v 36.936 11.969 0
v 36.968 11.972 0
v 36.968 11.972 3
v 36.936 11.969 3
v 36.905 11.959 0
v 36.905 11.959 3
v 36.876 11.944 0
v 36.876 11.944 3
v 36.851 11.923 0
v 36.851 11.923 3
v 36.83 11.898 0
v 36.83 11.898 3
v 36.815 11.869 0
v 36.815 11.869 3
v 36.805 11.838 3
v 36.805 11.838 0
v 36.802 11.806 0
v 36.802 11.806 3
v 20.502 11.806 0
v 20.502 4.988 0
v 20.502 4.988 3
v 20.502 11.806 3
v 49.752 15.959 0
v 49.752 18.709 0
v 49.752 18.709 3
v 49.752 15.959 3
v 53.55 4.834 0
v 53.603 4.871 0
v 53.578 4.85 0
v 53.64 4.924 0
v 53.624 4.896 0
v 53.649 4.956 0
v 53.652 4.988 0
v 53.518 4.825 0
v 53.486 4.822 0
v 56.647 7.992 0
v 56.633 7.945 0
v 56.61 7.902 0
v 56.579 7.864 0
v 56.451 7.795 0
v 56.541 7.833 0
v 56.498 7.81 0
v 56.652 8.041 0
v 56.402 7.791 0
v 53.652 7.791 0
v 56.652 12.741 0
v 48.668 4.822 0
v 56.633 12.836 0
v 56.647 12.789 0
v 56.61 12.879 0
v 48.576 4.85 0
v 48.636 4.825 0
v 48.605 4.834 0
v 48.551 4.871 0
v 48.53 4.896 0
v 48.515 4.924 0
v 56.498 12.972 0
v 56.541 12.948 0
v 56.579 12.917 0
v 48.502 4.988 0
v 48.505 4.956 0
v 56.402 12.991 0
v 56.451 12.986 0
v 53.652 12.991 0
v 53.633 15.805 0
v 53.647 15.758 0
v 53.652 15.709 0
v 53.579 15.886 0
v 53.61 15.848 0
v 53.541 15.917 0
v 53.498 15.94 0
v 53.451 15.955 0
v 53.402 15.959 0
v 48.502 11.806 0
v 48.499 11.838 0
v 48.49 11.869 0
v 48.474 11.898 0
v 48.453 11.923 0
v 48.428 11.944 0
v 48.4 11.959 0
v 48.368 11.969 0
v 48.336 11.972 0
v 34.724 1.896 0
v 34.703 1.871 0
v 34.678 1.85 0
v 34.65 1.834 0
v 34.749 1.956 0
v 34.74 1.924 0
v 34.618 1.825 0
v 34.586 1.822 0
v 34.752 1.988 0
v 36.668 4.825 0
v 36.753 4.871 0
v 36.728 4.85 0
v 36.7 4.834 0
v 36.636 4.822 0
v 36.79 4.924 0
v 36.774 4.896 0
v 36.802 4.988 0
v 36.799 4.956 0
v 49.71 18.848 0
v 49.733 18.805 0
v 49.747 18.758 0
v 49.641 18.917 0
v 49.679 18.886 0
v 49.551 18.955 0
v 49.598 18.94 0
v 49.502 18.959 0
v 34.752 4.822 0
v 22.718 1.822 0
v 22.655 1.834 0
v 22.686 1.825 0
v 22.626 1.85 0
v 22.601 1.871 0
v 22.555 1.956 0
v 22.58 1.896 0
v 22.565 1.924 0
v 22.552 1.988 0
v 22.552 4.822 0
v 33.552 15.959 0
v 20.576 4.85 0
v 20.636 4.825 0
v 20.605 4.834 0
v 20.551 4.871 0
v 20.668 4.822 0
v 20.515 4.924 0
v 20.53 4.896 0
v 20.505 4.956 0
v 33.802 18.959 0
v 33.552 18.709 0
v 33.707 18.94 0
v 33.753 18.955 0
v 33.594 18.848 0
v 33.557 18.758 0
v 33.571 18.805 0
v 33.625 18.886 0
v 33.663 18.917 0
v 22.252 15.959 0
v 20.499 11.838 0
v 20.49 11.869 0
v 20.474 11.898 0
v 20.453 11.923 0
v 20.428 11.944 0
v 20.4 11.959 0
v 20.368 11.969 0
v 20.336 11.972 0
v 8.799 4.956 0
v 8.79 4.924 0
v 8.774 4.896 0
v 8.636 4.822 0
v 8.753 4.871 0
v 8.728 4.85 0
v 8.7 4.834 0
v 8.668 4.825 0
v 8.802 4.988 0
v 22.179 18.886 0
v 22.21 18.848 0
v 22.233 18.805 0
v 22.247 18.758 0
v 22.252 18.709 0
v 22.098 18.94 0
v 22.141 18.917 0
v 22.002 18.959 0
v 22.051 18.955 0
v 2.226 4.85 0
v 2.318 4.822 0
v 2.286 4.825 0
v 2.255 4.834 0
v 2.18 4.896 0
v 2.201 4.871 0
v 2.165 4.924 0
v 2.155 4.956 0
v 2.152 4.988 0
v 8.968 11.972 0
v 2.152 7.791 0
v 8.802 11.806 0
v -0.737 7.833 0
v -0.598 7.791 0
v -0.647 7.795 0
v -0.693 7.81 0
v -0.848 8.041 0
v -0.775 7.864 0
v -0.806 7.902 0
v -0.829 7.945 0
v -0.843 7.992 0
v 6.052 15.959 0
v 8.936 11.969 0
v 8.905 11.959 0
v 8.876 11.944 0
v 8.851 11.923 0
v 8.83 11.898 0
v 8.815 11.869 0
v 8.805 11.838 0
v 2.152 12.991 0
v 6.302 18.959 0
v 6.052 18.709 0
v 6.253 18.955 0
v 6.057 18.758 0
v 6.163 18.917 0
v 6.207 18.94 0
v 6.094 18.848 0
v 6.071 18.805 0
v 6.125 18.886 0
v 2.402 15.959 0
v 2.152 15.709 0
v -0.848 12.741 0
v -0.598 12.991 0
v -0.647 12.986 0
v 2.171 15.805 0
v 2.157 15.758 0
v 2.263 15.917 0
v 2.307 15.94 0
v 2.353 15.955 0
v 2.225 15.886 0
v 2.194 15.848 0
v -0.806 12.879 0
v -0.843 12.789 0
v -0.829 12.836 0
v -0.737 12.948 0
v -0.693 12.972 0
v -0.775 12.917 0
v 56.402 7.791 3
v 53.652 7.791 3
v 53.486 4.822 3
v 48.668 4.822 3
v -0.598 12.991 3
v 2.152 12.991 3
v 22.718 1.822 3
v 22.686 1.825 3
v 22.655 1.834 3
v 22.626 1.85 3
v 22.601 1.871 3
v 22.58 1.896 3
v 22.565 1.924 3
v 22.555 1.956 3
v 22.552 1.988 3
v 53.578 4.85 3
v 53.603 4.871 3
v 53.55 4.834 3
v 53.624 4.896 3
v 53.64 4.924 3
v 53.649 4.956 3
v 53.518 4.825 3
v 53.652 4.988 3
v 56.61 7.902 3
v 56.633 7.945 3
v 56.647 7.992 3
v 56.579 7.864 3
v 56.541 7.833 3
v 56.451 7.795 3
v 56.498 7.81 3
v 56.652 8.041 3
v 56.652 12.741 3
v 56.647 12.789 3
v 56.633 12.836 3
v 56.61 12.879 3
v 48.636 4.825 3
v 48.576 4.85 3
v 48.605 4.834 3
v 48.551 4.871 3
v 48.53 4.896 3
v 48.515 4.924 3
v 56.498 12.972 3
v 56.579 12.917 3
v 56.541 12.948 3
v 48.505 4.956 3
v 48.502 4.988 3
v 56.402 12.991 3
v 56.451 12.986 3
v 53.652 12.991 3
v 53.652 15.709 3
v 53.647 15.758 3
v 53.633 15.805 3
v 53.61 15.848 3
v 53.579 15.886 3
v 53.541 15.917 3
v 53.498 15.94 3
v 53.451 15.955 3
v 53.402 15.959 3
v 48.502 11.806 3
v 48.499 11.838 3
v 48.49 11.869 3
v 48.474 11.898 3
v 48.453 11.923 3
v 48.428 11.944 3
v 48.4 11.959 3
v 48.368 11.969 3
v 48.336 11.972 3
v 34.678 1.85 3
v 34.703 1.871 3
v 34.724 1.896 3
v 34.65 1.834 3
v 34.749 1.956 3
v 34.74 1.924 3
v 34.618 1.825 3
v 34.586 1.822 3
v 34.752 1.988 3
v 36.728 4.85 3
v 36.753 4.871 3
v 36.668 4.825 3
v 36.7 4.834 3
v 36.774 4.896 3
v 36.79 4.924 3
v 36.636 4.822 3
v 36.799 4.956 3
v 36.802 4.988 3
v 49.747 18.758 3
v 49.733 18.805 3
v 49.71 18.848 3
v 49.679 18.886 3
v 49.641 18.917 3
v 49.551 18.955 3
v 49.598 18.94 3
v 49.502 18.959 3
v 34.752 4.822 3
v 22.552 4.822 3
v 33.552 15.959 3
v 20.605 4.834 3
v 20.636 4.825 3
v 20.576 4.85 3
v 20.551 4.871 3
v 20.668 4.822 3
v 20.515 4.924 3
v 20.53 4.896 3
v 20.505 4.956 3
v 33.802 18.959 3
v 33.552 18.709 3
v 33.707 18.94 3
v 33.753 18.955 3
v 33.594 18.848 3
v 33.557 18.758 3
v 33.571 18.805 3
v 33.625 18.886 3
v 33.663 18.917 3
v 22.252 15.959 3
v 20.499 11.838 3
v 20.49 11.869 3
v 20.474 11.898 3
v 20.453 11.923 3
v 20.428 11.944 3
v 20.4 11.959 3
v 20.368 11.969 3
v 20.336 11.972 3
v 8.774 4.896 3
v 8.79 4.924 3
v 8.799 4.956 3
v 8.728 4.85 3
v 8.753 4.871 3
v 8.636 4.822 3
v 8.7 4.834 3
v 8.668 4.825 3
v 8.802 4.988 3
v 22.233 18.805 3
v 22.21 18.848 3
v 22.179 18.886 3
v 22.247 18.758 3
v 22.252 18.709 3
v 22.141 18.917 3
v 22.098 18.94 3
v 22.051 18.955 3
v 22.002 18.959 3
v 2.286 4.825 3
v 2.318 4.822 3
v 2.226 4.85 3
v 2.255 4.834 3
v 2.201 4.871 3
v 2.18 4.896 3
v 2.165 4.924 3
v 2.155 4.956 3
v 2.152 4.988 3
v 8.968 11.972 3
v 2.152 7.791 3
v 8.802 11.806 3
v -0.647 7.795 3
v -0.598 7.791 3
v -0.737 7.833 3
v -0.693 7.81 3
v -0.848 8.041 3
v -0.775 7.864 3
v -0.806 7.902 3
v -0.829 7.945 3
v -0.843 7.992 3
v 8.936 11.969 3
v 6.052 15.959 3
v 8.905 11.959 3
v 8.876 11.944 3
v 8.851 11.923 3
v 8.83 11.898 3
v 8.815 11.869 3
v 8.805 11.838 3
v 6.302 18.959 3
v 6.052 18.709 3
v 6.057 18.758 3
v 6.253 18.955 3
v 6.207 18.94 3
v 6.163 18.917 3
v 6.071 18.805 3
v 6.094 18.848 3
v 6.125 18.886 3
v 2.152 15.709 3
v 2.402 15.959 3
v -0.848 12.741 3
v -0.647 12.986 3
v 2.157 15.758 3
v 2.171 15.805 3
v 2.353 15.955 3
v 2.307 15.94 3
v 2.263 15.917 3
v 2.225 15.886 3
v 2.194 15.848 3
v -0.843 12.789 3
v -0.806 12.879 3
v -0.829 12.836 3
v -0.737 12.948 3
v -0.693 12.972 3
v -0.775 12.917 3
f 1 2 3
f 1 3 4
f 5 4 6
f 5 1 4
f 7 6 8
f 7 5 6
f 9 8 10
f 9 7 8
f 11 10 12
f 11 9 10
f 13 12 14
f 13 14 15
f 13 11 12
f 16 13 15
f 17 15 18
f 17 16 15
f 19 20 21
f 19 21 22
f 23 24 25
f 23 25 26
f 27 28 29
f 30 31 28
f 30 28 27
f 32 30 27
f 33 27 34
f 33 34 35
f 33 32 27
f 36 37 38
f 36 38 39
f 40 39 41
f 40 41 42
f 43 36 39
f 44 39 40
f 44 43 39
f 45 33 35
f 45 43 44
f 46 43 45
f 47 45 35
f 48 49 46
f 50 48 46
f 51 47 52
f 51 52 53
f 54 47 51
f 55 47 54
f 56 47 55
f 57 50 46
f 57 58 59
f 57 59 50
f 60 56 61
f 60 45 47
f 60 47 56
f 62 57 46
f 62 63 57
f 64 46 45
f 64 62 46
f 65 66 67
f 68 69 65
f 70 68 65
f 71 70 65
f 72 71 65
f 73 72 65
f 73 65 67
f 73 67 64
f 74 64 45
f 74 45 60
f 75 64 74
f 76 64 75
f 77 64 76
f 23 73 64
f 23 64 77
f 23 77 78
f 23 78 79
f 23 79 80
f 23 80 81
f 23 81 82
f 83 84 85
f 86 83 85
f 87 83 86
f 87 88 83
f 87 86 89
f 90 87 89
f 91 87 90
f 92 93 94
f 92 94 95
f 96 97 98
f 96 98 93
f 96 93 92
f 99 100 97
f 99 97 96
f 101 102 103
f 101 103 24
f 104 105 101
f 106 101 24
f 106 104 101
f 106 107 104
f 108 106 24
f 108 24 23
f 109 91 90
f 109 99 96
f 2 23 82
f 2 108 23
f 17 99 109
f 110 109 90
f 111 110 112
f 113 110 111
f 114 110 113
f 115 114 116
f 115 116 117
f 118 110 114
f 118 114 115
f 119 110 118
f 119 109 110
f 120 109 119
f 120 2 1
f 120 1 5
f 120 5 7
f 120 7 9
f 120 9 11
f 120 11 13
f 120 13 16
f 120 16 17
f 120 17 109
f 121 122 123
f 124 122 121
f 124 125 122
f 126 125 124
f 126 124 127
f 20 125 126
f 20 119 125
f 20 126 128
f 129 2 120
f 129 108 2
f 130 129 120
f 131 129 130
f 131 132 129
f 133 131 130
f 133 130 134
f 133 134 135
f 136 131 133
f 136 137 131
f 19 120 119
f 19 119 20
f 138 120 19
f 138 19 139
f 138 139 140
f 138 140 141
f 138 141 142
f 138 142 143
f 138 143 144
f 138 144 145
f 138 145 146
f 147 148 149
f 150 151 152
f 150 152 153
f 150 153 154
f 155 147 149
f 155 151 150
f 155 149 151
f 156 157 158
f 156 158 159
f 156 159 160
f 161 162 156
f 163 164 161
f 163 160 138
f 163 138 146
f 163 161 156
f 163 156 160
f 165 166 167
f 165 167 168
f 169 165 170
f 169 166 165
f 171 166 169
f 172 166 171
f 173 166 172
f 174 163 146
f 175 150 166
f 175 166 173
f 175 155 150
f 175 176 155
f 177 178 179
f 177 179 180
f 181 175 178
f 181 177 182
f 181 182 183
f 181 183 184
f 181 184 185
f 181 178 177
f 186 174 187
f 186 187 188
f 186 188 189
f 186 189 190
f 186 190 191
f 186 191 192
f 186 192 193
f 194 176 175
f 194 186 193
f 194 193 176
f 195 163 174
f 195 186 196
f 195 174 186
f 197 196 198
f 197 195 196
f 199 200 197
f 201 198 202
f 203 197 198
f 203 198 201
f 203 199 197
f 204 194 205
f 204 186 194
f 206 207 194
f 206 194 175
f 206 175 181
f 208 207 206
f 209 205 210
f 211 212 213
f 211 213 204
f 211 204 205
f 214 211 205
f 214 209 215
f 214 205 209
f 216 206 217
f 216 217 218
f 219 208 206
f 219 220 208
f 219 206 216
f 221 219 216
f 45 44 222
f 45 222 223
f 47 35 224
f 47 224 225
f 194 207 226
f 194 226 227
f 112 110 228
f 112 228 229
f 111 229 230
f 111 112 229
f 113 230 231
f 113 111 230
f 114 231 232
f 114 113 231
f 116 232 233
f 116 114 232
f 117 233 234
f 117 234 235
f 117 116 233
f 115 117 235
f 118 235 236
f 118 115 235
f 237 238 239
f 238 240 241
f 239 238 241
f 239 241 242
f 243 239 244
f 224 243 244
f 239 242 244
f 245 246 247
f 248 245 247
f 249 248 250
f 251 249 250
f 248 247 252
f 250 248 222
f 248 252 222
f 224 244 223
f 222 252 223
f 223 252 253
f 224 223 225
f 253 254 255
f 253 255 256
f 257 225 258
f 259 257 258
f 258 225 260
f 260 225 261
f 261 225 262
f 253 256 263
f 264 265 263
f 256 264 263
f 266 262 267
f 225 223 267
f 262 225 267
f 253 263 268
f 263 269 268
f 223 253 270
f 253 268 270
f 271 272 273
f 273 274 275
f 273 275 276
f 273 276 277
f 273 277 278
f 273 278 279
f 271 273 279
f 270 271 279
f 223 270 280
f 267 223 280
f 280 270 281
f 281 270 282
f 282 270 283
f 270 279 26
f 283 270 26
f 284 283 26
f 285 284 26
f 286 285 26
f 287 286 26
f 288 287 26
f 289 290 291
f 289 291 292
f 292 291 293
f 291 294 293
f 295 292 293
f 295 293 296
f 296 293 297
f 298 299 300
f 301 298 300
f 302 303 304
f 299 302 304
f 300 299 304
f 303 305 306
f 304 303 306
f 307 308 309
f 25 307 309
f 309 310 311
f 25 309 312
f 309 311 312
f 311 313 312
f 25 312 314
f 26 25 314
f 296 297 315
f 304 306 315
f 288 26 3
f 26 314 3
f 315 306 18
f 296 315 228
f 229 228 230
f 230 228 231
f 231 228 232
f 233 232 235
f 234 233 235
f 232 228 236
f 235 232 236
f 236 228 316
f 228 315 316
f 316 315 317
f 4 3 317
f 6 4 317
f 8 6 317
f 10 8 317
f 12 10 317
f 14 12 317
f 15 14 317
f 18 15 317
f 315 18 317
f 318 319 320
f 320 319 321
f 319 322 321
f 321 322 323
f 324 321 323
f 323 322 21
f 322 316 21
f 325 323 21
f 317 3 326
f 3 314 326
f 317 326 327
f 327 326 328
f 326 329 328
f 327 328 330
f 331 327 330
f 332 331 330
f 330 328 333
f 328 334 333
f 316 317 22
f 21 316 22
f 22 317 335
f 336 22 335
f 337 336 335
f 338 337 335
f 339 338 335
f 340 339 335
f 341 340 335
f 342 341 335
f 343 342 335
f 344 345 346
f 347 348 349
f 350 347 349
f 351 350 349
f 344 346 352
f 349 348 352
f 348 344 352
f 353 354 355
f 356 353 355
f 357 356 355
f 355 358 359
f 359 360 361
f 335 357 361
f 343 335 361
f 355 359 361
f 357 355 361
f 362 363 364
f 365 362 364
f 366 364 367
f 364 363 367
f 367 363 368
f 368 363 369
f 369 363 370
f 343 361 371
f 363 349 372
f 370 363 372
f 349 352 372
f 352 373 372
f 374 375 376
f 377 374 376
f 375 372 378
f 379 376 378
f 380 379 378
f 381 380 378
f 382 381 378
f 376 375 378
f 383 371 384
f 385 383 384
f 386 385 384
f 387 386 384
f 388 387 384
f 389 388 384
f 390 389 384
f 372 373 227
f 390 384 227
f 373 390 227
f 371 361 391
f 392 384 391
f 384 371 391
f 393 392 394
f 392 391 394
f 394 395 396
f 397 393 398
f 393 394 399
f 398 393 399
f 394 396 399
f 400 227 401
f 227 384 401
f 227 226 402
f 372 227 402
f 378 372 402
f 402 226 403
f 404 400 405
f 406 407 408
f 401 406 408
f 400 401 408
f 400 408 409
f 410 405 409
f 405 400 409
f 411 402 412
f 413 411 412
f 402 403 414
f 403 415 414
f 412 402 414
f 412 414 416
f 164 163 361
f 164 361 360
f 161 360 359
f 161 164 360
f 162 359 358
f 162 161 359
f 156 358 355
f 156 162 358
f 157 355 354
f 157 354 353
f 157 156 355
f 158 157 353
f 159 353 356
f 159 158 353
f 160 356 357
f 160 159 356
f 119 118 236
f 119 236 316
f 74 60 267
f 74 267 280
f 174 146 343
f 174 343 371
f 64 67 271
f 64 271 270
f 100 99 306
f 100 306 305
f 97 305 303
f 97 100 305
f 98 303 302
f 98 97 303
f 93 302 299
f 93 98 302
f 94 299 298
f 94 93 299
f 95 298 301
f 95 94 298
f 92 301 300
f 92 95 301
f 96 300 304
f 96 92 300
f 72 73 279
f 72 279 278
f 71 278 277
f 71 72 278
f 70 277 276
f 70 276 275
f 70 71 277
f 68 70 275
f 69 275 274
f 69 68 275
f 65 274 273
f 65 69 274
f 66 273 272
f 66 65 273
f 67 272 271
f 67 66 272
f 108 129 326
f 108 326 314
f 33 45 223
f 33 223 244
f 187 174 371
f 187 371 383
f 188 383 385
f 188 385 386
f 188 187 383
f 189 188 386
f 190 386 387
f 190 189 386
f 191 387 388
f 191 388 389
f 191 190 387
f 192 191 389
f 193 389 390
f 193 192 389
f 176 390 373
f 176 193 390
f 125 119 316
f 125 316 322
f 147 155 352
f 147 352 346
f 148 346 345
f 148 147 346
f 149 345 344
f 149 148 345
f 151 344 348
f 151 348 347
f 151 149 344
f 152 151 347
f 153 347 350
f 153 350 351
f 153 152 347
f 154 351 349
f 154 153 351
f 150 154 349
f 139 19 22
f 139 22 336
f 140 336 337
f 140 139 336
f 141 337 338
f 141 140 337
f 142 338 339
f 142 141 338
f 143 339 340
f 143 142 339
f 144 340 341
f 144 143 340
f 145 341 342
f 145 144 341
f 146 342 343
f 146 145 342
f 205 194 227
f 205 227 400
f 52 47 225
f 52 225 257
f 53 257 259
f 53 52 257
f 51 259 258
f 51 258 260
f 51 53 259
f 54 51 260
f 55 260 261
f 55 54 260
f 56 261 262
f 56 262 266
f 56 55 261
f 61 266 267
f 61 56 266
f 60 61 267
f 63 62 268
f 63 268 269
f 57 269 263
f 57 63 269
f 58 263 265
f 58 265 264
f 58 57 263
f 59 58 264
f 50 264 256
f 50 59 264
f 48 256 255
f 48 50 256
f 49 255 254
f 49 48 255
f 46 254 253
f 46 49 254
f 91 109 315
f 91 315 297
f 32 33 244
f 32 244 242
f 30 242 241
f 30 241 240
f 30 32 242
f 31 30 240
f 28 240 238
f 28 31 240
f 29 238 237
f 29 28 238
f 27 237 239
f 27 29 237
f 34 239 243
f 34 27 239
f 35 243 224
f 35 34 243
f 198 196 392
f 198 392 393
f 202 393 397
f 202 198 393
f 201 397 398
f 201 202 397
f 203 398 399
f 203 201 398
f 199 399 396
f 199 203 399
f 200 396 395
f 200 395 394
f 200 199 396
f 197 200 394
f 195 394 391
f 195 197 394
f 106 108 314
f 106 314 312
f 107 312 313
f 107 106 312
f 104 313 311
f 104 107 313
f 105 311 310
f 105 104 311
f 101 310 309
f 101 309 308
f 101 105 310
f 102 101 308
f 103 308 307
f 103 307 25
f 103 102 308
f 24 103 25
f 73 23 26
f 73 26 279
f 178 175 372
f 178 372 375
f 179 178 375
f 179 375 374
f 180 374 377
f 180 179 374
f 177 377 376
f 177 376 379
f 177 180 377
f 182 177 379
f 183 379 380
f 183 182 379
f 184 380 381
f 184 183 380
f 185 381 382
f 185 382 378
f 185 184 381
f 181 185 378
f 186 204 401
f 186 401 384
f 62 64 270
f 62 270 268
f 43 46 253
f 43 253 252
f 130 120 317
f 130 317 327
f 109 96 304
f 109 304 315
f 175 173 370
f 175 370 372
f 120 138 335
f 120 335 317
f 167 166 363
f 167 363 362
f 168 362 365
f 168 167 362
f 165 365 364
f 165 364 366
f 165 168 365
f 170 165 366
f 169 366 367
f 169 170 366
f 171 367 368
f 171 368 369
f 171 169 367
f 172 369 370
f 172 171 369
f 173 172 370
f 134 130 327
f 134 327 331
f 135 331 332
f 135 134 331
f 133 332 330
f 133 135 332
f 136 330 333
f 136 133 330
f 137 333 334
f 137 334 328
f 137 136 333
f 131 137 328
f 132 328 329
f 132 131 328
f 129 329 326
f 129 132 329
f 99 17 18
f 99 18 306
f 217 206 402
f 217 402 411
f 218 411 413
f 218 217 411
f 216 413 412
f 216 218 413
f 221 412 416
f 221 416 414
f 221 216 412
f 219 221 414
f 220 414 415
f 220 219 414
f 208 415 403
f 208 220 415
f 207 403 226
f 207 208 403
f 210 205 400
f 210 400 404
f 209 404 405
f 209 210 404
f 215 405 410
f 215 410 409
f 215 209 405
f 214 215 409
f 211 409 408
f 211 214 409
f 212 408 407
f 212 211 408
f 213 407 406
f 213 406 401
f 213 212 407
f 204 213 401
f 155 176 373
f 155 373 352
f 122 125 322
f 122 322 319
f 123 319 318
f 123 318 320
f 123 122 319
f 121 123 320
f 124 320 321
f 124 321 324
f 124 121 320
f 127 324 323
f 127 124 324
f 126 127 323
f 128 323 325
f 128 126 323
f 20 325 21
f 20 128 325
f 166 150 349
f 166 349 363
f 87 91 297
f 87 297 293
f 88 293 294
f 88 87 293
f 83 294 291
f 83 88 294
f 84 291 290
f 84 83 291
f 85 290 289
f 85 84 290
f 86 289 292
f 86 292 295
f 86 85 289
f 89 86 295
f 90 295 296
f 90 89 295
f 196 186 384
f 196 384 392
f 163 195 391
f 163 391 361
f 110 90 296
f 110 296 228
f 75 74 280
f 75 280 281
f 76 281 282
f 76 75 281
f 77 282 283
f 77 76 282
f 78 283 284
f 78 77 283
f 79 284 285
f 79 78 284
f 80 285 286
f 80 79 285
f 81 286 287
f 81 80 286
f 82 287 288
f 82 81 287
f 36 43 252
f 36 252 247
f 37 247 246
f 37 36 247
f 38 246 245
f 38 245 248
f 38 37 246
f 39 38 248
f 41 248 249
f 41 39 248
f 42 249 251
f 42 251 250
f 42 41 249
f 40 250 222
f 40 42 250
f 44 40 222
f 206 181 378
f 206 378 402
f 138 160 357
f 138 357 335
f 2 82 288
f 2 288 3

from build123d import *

# Parameters (mm, degrees)
BOSS_EXTRUDE1_DEPTH = 3


with BuildPart() as part:
    # Sketch2 → Boss-Extrude1 (new body)
    with BuildSketch(Plane.XY):
        with BuildLine():
            Line((53.652188988, 7.790592853), (53.652188988, 4.988083366))
            ThreePointArc((53.652188988, 4.988083366), (53.60349827, 4.870533572), (53.485948476, 4.821842853))
            Line((53.485948476, 4.821842853), (48.668429501, 4.821842853))
            ThreePointArc((48.668429501, 4.821842853), (48.550879707, 4.870533572), (48.502188988, 4.988083366))
            Line((48.502188988, 4.988083366), (48.502188988, 11.80560234))
            ThreePointArc((48.502188988, 11.80560234), (48.45349827, 11.923152134), (48.335948476, 11.971842853))
            Line((48.335948476, 11.971842853), (36.968429501, 11.971842853))
            ThreePointArc((36.968429501, 11.971842853), (36.850879707, 11.923152134), (36.802188988, 11.80560234))
            Line((36.802188988, 11.80560234), (36.802188988, 4.988083366))
            ThreePointArc((36.802188988, 4.988083366), (36.75349827, 4.870533572), (36.635948476, 4.821842853))
            Line((36.635948476, 4.821842853), (34.752188988, 4.821842853))
            Line((34.752188988, 4.821842853), (34.752188988, 1.988083366))
            ThreePointArc((34.752188988, 1.988083366), (34.70349827, 1.870533572), (34.585948476, 1.821842853))
            Line((34.585948476, 1.821842853), (22.718429501, 1.821842853))
            ThreePointArc((22.718429501, 1.821842853), (22.600879707, 1.870533572), (22.552188988, 1.988083366))
            Line((22.552188988, 1.988083366), (22.552188988, 4.821842853))
            Line((22.552188988, 4.821842853), (20.668429501, 4.821842853))
            ThreePointArc((20.668429501, 4.821842853), (20.550879707, 4.870533572), (20.502188988, 4.988083366))
            Line((20.502188988, 4.988083366), (20.502188988, 11.80560234))
            ThreePointArc((20.502188988, 11.80560234), (20.45349827, 11.923152134), (20.335948476, 11.971842853))
            Line((20.335948476, 11.971842853), (8.968429501, 11.971842853))
            ThreePointArc((8.968429501, 11.971842853), (8.850879707, 11.923152134), (8.802188988, 11.80560234))
            Line((8.802188988, 11.80560234), (8.802188988, 4.988083366))
            ThreePointArc((8.802188988, 4.988083366), (8.75349827, 4.870533572), (8.635948476, 4.821842853))
            Line((8.635948476, 4.821842853), (2.318429501, 4.821842853))
            ThreePointArc((2.318429501, 4.821842853), (2.200879707, 4.870533572), (2.152188988, 4.988083366))
            Line((2.152188988, 4.988083366), (2.152188988, 7.790592853))
            Line((2.152188988, 7.790592853), (-0.597811012, 7.790592853))
            ThreePointArc((-0.597811012, 7.790592853), (-0.774587707, 7.863816157), (-0.847811012, 8.040592853))
            Line((-0.847811012, 8.040592853), (-0.847811012, 12.740592853))
            ThreePointArc((-0.847811012, 12.740592853), (-0.774587707, 12.917369548), (-0.597811012, 12.990592853))
            Line((-0.597811012, 12.990592853), (2.152188988, 12.990592853))
            Line((2.152188988, 12.990592853), (2.152188988, 15.709342853))
            ThreePointArc((2.152188988, 15.709342853), (2.225412293, 15.886119548), (2.402188988, 15.959342853))
            Line((2.402188988, 15.959342853), (6.052188988, 15.959342853))
            Line((6.052188988, 15.959342853), (6.052188988, 18.709342853))
            ThreePointArc((6.052188988, 18.709342853), (6.125412293, 18.886119548), (6.302188988, 18.959342853))
            Line((6.302188988, 18.959342853), (22.002188988, 18.959342853))
            ThreePointArc((22.002188988, 18.959342853), (22.178965684, 18.886119548), (22.252188988, 18.709342853))
            Line((22.252188988, 18.709342853), (22.252188988, 15.959342853))
            Line((22.252188988, 15.959342853), (33.552188988, 15.959342853))
            Line((33.552188988, 15.959342853), (33.552188988, 18.709342853))
            ThreePointArc((33.552188988, 18.709342853), (33.625412293, 18.886119548), (33.802188988, 18.959342853))
            Line((33.802188988, 18.959342853), (49.502188988, 18.959342853))
            ThreePointArc((49.502188988, 18.959342853), (49.678965684, 18.886119548), (49.752188988, 18.709342853))
            Line((49.752188988, 18.709342853), (49.752188988, 15.959342853))
            Line((49.752188988, 15.959342853), (53.402188988, 15.959342853))
            ThreePointArc((53.402188988, 15.959342853), (53.578965684, 15.886119548), (53.652188988, 15.709342853))
            Line((53.652188988, 15.709342853), (53.652188988, 12.990592853))
            Line((53.652188988, 12.990592853), (56.402188988, 12.990592853))
            ThreePointArc((56.402188988, 12.990592853), (56.578965684, 12.917369548), (56.652188988, 12.740592853))
            Line((56.652188988, 12.740592853), (56.652188988, 8.040592853))
            ThreePointArc((56.652188988, 8.040592853), (56.578965684, 7.863816157), (56.402188988, 7.790592853))
            Line((56.402188988, 7.790592853), (53.652188988, 7.790592853))
        make_face()
    extrude(amount=BOSS_EXTRUDE1_DEPTH)


solid = part.part
